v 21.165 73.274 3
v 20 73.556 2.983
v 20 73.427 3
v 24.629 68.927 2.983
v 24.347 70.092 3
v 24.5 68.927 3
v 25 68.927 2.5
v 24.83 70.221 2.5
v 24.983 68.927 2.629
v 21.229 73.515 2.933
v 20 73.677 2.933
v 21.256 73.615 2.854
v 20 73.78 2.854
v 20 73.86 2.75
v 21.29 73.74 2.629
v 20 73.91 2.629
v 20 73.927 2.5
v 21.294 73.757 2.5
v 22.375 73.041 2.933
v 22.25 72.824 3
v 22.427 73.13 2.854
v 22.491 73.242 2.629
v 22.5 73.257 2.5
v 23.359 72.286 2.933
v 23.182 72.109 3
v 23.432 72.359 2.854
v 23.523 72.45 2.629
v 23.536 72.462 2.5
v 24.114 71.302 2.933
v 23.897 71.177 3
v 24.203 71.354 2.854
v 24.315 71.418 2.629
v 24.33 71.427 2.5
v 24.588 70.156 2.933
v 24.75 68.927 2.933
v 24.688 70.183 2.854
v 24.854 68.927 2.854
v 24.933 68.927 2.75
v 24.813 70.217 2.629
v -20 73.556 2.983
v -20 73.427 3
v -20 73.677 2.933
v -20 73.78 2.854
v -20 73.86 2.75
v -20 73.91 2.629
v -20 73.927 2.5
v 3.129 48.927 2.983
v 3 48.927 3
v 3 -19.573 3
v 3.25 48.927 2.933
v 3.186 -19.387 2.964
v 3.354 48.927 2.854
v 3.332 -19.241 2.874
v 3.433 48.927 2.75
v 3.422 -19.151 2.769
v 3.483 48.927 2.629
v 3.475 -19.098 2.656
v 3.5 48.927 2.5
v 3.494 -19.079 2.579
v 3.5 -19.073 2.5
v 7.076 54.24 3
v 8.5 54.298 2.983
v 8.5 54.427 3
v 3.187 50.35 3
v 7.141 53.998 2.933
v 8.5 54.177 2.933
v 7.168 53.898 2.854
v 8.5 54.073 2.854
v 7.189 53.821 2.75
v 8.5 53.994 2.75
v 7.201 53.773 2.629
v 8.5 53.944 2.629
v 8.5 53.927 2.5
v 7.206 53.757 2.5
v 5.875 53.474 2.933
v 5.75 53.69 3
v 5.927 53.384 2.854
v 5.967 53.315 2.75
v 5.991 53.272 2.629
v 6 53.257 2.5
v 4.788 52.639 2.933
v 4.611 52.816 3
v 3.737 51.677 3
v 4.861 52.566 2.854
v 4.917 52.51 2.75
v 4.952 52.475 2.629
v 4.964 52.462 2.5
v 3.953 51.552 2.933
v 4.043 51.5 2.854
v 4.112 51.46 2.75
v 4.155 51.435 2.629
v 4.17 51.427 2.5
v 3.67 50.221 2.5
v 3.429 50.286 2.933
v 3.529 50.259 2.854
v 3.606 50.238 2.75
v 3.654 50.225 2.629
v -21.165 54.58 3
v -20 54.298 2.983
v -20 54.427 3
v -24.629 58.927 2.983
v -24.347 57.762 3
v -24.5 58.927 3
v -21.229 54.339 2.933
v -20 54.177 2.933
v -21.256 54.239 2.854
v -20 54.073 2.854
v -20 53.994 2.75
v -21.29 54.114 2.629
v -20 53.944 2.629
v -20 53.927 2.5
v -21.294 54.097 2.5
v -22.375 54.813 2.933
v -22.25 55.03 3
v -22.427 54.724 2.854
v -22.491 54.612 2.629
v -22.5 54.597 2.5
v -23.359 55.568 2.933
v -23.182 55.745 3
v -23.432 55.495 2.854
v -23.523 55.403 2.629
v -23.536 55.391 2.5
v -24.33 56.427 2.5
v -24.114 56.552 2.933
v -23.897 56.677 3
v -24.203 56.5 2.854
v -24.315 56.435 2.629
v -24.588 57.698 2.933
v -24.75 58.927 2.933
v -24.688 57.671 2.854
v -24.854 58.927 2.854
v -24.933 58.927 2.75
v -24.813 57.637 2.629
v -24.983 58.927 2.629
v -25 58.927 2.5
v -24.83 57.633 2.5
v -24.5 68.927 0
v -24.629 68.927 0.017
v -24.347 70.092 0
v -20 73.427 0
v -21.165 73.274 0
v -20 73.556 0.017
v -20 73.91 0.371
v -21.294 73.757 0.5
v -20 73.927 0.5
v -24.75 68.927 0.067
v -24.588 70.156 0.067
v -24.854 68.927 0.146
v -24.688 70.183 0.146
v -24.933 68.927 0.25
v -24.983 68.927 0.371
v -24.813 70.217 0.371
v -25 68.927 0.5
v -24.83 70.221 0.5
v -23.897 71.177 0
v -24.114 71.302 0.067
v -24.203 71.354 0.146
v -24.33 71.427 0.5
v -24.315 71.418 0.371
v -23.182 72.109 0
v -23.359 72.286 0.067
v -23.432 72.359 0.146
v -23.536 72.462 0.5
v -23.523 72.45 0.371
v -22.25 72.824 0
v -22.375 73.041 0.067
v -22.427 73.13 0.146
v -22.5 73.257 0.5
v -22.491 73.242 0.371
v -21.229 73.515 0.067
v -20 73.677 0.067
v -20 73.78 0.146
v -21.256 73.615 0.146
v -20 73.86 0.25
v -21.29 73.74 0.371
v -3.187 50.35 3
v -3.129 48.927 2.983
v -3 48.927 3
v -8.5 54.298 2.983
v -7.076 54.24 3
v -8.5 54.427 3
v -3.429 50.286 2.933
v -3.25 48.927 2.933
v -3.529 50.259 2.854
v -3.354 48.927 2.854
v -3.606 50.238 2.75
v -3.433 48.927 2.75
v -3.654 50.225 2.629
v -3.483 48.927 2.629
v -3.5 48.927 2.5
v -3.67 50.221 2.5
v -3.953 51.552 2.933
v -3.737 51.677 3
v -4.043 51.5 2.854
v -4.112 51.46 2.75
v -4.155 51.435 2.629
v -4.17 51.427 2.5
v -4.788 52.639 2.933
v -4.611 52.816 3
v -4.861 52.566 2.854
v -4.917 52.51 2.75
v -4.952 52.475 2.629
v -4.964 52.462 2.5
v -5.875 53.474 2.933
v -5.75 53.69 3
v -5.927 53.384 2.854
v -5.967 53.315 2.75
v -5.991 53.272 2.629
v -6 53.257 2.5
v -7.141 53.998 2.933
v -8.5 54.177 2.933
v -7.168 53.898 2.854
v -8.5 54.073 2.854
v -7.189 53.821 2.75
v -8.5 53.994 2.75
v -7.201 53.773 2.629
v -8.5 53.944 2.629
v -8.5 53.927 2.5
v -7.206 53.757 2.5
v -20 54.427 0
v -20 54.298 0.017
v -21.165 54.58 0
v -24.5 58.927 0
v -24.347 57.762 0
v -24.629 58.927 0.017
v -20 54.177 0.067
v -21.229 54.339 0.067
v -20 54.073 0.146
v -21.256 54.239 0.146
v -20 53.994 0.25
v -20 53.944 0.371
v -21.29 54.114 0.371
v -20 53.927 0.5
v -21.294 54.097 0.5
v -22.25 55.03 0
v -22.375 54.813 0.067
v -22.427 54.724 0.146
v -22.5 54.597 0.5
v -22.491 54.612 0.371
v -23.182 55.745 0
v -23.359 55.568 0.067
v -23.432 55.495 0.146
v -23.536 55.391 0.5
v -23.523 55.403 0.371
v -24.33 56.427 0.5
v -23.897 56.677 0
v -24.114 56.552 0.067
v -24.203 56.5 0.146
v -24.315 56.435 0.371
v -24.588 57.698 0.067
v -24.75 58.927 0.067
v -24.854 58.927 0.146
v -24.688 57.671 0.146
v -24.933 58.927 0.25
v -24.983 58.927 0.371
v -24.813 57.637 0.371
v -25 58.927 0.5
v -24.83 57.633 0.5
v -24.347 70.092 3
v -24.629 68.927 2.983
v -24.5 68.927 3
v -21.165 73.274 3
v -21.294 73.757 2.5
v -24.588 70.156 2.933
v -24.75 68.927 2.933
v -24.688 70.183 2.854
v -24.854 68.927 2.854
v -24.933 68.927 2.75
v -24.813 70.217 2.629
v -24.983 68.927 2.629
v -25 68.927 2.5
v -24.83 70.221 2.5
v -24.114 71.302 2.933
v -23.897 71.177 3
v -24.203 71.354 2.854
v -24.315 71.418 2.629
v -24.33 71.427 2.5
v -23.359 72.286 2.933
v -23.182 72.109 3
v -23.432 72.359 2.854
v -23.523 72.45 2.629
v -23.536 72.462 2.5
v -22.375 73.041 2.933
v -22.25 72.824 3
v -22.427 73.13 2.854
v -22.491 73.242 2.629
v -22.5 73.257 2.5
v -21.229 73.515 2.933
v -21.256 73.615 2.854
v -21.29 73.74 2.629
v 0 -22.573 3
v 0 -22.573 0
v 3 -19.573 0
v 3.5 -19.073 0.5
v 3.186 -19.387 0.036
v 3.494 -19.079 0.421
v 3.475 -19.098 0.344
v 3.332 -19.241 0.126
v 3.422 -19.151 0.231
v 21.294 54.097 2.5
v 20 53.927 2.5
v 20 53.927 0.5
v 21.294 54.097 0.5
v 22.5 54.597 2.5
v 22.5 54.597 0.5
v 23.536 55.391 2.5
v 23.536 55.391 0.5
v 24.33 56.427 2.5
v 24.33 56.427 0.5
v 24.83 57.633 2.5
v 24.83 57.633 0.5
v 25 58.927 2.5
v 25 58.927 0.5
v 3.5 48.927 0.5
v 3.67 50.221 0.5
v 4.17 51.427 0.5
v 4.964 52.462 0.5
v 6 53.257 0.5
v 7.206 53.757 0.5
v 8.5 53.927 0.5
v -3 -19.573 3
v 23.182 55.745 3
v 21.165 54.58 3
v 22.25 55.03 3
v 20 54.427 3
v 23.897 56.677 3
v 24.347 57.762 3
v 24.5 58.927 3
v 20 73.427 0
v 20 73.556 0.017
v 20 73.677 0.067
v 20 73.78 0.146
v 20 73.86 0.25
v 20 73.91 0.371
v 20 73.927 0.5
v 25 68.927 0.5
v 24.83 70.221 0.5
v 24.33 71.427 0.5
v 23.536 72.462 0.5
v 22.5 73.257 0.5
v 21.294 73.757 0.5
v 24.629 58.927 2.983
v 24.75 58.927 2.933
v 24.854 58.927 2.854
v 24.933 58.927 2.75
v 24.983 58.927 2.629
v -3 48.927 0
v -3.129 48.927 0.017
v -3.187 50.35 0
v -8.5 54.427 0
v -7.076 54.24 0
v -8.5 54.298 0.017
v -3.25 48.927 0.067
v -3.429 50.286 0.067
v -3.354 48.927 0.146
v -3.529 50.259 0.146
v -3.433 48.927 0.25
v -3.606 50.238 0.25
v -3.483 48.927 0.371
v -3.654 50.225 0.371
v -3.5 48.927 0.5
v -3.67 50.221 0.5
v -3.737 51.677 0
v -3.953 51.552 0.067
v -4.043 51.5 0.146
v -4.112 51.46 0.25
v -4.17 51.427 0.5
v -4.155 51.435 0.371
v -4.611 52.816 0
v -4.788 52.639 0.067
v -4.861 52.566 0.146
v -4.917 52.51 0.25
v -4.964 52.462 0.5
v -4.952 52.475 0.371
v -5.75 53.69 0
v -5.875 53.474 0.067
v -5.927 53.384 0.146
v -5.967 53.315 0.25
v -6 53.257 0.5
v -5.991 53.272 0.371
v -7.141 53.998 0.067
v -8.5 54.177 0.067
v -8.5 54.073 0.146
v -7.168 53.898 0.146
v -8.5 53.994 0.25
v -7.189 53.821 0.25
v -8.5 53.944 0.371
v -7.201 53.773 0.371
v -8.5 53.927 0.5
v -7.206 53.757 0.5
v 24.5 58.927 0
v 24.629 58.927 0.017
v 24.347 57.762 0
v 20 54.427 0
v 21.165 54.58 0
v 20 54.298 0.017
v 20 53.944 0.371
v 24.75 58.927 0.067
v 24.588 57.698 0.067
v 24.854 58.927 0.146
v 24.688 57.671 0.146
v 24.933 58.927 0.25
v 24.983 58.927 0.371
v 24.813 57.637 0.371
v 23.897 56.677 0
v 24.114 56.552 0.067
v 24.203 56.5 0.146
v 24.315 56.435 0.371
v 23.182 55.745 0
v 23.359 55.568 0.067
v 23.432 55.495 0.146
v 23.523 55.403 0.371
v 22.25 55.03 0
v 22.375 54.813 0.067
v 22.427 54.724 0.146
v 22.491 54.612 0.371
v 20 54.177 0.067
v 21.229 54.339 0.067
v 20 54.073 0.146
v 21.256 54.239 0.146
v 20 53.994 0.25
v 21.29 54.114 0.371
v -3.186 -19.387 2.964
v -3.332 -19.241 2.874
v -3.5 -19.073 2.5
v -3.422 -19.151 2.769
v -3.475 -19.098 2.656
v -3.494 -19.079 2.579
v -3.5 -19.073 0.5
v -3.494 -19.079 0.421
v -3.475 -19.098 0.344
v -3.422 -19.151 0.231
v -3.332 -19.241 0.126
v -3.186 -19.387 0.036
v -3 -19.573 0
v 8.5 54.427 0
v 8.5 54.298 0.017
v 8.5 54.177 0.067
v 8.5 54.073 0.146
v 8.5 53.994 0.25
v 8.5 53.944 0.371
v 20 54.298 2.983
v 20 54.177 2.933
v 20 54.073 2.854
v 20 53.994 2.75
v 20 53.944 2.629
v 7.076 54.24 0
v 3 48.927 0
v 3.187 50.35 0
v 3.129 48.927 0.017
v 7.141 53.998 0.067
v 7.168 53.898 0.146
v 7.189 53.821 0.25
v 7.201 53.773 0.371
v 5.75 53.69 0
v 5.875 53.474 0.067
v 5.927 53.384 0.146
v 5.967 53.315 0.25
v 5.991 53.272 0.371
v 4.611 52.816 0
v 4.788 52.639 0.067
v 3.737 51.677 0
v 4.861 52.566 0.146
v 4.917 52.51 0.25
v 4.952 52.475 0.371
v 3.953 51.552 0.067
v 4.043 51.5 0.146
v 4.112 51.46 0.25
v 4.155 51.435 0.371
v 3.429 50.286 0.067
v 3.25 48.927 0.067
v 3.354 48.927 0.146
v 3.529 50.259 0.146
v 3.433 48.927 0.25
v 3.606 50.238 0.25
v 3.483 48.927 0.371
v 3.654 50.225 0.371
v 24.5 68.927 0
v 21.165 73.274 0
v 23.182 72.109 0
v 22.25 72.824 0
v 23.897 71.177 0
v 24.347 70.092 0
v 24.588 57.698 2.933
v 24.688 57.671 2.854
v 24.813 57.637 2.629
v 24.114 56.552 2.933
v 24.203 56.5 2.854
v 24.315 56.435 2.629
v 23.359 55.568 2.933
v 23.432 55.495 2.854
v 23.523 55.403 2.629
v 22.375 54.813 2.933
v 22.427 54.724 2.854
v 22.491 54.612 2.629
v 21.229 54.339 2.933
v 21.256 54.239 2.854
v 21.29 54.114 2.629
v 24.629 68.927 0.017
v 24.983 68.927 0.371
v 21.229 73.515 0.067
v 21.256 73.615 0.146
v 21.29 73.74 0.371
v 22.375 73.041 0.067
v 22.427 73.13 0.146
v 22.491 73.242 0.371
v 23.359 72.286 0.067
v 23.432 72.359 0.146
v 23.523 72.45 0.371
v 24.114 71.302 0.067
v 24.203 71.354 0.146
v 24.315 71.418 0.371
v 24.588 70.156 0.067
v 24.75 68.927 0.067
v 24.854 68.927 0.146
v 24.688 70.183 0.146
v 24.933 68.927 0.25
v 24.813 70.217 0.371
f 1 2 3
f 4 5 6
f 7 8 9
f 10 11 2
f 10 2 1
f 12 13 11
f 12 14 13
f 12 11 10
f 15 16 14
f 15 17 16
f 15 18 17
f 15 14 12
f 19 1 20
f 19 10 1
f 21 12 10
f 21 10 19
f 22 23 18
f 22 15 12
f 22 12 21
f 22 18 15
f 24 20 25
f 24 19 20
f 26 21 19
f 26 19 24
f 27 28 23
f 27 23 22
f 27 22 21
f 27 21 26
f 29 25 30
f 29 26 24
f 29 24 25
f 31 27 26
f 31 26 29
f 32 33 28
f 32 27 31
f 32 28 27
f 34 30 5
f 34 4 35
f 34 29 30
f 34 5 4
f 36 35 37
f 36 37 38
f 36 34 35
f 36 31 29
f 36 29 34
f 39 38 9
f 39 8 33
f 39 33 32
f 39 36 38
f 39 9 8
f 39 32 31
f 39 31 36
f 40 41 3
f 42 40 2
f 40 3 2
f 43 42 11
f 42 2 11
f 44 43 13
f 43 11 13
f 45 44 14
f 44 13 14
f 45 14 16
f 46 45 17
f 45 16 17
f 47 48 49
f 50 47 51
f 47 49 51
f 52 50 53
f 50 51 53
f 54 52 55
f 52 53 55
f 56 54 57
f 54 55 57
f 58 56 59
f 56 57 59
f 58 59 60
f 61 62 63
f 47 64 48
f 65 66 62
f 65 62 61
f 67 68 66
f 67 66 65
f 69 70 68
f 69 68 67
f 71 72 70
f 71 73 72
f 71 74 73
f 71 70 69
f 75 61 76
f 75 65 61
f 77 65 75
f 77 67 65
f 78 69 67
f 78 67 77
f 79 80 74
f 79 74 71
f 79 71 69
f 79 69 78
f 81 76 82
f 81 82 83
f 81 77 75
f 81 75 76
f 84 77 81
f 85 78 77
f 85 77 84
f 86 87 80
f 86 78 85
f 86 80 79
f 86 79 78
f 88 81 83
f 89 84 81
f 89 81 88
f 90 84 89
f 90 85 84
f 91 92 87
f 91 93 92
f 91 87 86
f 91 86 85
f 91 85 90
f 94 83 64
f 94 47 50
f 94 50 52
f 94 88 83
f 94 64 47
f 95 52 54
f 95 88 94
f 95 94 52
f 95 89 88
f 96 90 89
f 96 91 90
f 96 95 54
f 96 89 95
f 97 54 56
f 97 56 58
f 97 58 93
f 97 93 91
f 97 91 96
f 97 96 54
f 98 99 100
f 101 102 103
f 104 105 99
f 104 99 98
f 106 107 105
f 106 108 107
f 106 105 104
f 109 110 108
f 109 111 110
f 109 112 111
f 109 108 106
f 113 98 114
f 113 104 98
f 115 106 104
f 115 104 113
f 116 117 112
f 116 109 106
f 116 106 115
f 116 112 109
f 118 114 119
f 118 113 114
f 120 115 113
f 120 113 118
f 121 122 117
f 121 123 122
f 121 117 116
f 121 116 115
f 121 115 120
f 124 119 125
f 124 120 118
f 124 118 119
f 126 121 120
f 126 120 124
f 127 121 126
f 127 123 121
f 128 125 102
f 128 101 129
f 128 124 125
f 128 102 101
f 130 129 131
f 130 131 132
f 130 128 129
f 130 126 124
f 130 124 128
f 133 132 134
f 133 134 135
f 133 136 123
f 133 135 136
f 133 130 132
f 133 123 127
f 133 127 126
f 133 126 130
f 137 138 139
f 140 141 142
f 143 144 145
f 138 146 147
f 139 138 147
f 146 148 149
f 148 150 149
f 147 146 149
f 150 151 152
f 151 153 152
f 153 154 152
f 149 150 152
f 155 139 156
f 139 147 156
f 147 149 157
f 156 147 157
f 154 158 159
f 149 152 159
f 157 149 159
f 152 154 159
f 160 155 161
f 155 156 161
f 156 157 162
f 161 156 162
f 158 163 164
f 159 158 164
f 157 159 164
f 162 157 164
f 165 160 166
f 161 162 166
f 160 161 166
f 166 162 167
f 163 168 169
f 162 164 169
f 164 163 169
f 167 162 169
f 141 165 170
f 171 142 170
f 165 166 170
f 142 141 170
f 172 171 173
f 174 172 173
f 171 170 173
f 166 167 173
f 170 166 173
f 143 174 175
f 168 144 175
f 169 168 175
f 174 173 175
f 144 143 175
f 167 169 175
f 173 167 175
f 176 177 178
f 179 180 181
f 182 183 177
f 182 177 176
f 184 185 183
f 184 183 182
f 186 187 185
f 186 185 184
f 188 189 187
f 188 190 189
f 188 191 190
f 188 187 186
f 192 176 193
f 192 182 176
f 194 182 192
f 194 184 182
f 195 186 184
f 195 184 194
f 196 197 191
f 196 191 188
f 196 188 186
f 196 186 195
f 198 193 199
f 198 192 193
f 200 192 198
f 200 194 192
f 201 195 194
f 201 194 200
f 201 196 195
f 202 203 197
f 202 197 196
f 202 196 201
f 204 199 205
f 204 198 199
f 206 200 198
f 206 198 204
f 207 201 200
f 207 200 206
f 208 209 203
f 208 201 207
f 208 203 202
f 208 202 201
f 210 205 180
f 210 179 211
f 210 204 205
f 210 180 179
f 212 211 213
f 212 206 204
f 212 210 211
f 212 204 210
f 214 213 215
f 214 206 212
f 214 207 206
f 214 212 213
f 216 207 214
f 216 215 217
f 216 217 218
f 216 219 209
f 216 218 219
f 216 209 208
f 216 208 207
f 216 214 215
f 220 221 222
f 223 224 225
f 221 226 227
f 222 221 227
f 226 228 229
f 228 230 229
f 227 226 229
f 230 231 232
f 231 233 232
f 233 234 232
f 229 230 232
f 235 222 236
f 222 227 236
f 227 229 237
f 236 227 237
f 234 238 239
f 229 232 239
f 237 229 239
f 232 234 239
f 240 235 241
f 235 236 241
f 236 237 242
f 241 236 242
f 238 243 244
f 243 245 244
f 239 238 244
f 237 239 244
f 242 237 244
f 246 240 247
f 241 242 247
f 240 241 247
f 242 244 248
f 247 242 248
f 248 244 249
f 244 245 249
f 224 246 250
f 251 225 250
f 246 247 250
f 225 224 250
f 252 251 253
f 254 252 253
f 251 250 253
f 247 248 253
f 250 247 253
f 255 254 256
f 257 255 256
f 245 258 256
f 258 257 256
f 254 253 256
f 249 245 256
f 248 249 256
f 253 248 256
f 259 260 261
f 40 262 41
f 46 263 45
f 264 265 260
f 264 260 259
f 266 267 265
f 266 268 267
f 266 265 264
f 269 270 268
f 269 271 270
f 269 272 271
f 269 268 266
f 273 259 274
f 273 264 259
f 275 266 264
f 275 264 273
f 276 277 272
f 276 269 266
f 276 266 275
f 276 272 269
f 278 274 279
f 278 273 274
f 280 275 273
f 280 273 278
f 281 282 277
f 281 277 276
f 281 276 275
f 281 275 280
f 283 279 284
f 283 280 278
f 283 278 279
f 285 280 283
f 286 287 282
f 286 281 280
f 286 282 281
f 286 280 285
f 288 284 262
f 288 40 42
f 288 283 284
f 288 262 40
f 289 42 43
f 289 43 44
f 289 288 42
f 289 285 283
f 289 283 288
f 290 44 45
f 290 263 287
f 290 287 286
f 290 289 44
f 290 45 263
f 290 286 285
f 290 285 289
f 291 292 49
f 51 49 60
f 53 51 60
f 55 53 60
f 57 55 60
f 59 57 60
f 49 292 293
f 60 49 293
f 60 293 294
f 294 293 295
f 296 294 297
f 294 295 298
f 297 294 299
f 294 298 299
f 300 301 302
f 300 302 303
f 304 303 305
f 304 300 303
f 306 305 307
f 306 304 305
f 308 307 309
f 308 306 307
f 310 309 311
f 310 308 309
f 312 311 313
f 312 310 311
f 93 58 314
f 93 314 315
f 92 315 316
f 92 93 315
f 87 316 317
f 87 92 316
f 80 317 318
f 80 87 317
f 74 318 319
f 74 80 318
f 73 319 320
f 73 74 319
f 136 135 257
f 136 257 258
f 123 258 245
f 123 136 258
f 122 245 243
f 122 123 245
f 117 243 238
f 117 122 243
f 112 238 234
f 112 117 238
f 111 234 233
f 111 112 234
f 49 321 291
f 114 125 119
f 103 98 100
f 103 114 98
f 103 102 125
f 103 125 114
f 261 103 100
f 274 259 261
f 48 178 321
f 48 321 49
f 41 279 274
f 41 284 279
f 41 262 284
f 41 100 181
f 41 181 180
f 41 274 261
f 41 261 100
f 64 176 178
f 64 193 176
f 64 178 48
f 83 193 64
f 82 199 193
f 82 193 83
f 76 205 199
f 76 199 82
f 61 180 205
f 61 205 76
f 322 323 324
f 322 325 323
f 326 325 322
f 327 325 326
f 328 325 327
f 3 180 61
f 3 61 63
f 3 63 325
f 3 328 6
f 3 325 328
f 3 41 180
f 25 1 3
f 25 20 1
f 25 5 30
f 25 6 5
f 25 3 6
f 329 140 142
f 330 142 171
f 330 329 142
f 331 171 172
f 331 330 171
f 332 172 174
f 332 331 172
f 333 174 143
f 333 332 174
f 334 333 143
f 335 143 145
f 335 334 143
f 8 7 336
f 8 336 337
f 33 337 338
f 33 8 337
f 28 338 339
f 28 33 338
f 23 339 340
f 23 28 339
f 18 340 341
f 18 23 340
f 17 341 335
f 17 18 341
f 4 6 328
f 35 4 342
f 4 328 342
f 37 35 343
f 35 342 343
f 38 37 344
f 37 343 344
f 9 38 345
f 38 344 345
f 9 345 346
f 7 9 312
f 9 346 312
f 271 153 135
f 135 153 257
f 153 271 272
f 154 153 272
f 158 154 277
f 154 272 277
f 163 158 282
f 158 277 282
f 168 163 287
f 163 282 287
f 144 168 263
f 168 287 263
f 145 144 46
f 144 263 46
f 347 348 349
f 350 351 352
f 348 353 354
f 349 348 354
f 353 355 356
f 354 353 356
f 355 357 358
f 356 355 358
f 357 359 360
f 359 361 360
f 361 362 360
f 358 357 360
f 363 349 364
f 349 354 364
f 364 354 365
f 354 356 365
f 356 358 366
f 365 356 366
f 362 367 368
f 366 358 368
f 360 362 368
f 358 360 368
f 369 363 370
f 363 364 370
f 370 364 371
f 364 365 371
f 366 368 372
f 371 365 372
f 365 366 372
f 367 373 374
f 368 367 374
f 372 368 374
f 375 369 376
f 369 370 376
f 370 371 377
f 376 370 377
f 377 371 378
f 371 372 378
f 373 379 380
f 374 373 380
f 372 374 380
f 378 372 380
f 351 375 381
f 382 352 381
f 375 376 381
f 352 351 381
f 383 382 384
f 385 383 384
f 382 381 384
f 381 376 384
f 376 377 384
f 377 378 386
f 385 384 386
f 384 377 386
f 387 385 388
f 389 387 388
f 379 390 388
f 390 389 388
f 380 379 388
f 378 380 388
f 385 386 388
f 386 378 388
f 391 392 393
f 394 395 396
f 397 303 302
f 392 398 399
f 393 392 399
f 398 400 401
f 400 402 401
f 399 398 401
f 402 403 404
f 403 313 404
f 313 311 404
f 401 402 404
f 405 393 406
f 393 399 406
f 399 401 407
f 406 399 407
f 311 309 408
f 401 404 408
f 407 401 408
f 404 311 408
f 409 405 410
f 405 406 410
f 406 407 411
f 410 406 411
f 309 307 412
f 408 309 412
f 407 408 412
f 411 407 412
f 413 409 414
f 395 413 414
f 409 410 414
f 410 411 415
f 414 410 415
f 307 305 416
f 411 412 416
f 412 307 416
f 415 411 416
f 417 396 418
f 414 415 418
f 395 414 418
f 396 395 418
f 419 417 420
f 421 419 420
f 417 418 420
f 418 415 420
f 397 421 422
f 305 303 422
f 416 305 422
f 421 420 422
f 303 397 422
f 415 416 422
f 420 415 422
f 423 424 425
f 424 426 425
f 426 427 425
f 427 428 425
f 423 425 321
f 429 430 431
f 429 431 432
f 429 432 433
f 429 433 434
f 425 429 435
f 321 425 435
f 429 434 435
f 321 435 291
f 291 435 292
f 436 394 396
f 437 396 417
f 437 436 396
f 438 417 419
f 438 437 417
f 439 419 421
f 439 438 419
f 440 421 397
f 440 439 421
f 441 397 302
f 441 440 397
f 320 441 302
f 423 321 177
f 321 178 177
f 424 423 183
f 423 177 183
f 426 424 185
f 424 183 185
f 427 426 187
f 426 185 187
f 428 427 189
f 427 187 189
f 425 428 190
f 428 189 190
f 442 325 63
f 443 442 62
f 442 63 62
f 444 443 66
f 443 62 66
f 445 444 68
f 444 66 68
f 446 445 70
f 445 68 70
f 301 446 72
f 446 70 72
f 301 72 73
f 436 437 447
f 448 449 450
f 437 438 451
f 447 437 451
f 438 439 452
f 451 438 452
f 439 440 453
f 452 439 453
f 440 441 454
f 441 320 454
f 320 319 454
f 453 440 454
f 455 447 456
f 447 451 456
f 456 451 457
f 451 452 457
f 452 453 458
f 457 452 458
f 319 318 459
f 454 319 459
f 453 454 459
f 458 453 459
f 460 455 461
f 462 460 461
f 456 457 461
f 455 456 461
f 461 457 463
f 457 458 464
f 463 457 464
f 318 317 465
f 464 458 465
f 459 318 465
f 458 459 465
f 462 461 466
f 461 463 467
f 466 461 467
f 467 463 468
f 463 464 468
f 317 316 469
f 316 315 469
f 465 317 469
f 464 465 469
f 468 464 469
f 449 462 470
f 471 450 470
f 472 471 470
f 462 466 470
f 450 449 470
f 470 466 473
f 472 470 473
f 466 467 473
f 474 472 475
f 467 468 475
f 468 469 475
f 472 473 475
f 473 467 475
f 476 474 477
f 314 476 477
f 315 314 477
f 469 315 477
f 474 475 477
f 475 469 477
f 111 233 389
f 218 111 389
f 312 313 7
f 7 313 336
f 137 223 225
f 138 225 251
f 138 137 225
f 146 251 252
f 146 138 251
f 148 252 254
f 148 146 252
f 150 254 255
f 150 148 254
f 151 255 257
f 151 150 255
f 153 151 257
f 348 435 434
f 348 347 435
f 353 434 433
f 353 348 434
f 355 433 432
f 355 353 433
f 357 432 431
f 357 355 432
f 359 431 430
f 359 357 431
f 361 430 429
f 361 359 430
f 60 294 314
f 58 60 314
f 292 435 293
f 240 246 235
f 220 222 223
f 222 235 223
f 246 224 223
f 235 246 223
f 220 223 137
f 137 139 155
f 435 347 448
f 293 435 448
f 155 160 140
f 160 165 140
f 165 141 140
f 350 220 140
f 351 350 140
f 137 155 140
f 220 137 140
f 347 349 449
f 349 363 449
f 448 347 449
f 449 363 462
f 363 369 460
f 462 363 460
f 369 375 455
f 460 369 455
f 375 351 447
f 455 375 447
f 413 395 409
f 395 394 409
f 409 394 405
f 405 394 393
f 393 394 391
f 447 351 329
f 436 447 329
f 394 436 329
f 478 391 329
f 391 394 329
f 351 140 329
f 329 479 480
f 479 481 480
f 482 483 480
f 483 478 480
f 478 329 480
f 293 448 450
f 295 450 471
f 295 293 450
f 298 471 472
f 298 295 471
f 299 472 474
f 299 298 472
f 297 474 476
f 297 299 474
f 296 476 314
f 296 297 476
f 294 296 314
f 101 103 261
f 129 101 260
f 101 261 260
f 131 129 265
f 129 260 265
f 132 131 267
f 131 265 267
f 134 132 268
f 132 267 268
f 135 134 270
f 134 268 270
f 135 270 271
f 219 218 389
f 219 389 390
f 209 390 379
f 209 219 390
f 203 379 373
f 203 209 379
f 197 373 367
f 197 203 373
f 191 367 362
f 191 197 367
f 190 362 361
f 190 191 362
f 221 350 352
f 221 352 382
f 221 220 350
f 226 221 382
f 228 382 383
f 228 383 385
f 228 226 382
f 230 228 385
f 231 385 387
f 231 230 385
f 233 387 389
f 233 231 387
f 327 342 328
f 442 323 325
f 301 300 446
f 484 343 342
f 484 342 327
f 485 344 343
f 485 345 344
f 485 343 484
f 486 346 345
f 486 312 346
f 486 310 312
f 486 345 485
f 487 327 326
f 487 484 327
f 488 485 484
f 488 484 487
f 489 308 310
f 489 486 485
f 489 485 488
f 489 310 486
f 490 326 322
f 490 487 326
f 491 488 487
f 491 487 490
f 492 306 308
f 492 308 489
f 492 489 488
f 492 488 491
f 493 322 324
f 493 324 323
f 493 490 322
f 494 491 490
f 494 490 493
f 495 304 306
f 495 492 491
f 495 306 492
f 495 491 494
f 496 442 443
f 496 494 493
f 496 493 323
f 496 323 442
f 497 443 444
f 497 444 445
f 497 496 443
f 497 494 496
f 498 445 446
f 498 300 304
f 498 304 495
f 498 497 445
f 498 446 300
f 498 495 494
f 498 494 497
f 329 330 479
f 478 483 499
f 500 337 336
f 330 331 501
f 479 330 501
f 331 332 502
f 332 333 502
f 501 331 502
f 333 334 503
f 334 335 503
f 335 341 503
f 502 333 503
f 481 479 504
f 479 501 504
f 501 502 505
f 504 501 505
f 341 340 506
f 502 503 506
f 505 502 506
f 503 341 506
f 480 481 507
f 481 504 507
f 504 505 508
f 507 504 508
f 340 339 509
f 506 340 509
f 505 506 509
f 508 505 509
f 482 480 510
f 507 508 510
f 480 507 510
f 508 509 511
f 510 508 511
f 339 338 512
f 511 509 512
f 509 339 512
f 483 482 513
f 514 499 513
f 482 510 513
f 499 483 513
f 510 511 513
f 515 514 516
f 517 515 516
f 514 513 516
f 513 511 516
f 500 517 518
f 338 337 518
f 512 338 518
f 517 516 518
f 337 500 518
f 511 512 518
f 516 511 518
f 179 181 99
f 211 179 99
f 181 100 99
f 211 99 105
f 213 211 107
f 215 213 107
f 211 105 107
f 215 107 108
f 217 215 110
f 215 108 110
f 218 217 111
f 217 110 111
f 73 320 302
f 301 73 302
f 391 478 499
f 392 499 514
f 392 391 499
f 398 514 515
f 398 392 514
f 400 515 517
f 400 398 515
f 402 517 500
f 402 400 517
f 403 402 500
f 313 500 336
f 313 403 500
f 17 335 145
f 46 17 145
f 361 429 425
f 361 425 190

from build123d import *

# Parameters (mm, degrees)
F0_W        = 7
F0_H        = 80
F1_DEPTH    = 3
F2_R        = 5
F3_T1_DEPTH = 39.0035618315
F4_R        = 0.5


# Not quite as in the source:
# - a fillet or chamfer that OpenCascade refuses, or shapes differently, is made with other operations: its cross-section is extruded or revolved along the edge and cut away or added


with BuildPart() as f1:
    # F0 (on Top) → F1 (new body)
    with BuildSketch(Plane.XY):
        Polygon((-25, 73.9269424736), (-25, 53.9269424736), (-3.5, 53.9269424736), (3.5, 53.9269424736), (25, 53.9269424736), (25, 73.9269424736), align=None)
        with Locations((0, 13.9269424736)):
            Rectangle(F0_W, F0_H)
    extrude(amount=F1_DEPTH)

    # F2
    f2_edges = [f1.edges().sort_by_distance(p)[0] for p in [
        (-25, 73.926942, 1.5),
        (25, 73.926942, 1.5),
        (25, 53.926942, 1.5),
        (3.5, 53.926942, 1.5),
        (-3.5, 53.926942, 1.5),
        (-25, 53.926942, 1.5),
    ]]
    fillet(f2_edges, radius=F2_R)

    # F3: chamfer of 7 on 2 edges, made by hand

    # F3_s2 → F3_t1 (cut)
    with BuildSketch(Plane.XY.offset(-18.0017809158)):
        Polygon((-3.5, -19.0730575264), (3.5, -26.0730575264), (-3.5, -26.0730575264), align=None)
        Polygon((-3.5, -26.0730575264), (3.5, -19.0730575264), (3.5, -26.0730575264), align=None)
    extrude(amount=F3_T1_DEPTH, mode=Mode.SUBTRACT)

    # F4
    f4_edges = [f1.edges().sort_by_distance(p)[0] for p in [
        (-3.5, 14.926942, 3),
        (-3.5, 14.926942, 0),
    ]]
    fillet(f4_edges, radius=F4_R)


solid = f1.part
